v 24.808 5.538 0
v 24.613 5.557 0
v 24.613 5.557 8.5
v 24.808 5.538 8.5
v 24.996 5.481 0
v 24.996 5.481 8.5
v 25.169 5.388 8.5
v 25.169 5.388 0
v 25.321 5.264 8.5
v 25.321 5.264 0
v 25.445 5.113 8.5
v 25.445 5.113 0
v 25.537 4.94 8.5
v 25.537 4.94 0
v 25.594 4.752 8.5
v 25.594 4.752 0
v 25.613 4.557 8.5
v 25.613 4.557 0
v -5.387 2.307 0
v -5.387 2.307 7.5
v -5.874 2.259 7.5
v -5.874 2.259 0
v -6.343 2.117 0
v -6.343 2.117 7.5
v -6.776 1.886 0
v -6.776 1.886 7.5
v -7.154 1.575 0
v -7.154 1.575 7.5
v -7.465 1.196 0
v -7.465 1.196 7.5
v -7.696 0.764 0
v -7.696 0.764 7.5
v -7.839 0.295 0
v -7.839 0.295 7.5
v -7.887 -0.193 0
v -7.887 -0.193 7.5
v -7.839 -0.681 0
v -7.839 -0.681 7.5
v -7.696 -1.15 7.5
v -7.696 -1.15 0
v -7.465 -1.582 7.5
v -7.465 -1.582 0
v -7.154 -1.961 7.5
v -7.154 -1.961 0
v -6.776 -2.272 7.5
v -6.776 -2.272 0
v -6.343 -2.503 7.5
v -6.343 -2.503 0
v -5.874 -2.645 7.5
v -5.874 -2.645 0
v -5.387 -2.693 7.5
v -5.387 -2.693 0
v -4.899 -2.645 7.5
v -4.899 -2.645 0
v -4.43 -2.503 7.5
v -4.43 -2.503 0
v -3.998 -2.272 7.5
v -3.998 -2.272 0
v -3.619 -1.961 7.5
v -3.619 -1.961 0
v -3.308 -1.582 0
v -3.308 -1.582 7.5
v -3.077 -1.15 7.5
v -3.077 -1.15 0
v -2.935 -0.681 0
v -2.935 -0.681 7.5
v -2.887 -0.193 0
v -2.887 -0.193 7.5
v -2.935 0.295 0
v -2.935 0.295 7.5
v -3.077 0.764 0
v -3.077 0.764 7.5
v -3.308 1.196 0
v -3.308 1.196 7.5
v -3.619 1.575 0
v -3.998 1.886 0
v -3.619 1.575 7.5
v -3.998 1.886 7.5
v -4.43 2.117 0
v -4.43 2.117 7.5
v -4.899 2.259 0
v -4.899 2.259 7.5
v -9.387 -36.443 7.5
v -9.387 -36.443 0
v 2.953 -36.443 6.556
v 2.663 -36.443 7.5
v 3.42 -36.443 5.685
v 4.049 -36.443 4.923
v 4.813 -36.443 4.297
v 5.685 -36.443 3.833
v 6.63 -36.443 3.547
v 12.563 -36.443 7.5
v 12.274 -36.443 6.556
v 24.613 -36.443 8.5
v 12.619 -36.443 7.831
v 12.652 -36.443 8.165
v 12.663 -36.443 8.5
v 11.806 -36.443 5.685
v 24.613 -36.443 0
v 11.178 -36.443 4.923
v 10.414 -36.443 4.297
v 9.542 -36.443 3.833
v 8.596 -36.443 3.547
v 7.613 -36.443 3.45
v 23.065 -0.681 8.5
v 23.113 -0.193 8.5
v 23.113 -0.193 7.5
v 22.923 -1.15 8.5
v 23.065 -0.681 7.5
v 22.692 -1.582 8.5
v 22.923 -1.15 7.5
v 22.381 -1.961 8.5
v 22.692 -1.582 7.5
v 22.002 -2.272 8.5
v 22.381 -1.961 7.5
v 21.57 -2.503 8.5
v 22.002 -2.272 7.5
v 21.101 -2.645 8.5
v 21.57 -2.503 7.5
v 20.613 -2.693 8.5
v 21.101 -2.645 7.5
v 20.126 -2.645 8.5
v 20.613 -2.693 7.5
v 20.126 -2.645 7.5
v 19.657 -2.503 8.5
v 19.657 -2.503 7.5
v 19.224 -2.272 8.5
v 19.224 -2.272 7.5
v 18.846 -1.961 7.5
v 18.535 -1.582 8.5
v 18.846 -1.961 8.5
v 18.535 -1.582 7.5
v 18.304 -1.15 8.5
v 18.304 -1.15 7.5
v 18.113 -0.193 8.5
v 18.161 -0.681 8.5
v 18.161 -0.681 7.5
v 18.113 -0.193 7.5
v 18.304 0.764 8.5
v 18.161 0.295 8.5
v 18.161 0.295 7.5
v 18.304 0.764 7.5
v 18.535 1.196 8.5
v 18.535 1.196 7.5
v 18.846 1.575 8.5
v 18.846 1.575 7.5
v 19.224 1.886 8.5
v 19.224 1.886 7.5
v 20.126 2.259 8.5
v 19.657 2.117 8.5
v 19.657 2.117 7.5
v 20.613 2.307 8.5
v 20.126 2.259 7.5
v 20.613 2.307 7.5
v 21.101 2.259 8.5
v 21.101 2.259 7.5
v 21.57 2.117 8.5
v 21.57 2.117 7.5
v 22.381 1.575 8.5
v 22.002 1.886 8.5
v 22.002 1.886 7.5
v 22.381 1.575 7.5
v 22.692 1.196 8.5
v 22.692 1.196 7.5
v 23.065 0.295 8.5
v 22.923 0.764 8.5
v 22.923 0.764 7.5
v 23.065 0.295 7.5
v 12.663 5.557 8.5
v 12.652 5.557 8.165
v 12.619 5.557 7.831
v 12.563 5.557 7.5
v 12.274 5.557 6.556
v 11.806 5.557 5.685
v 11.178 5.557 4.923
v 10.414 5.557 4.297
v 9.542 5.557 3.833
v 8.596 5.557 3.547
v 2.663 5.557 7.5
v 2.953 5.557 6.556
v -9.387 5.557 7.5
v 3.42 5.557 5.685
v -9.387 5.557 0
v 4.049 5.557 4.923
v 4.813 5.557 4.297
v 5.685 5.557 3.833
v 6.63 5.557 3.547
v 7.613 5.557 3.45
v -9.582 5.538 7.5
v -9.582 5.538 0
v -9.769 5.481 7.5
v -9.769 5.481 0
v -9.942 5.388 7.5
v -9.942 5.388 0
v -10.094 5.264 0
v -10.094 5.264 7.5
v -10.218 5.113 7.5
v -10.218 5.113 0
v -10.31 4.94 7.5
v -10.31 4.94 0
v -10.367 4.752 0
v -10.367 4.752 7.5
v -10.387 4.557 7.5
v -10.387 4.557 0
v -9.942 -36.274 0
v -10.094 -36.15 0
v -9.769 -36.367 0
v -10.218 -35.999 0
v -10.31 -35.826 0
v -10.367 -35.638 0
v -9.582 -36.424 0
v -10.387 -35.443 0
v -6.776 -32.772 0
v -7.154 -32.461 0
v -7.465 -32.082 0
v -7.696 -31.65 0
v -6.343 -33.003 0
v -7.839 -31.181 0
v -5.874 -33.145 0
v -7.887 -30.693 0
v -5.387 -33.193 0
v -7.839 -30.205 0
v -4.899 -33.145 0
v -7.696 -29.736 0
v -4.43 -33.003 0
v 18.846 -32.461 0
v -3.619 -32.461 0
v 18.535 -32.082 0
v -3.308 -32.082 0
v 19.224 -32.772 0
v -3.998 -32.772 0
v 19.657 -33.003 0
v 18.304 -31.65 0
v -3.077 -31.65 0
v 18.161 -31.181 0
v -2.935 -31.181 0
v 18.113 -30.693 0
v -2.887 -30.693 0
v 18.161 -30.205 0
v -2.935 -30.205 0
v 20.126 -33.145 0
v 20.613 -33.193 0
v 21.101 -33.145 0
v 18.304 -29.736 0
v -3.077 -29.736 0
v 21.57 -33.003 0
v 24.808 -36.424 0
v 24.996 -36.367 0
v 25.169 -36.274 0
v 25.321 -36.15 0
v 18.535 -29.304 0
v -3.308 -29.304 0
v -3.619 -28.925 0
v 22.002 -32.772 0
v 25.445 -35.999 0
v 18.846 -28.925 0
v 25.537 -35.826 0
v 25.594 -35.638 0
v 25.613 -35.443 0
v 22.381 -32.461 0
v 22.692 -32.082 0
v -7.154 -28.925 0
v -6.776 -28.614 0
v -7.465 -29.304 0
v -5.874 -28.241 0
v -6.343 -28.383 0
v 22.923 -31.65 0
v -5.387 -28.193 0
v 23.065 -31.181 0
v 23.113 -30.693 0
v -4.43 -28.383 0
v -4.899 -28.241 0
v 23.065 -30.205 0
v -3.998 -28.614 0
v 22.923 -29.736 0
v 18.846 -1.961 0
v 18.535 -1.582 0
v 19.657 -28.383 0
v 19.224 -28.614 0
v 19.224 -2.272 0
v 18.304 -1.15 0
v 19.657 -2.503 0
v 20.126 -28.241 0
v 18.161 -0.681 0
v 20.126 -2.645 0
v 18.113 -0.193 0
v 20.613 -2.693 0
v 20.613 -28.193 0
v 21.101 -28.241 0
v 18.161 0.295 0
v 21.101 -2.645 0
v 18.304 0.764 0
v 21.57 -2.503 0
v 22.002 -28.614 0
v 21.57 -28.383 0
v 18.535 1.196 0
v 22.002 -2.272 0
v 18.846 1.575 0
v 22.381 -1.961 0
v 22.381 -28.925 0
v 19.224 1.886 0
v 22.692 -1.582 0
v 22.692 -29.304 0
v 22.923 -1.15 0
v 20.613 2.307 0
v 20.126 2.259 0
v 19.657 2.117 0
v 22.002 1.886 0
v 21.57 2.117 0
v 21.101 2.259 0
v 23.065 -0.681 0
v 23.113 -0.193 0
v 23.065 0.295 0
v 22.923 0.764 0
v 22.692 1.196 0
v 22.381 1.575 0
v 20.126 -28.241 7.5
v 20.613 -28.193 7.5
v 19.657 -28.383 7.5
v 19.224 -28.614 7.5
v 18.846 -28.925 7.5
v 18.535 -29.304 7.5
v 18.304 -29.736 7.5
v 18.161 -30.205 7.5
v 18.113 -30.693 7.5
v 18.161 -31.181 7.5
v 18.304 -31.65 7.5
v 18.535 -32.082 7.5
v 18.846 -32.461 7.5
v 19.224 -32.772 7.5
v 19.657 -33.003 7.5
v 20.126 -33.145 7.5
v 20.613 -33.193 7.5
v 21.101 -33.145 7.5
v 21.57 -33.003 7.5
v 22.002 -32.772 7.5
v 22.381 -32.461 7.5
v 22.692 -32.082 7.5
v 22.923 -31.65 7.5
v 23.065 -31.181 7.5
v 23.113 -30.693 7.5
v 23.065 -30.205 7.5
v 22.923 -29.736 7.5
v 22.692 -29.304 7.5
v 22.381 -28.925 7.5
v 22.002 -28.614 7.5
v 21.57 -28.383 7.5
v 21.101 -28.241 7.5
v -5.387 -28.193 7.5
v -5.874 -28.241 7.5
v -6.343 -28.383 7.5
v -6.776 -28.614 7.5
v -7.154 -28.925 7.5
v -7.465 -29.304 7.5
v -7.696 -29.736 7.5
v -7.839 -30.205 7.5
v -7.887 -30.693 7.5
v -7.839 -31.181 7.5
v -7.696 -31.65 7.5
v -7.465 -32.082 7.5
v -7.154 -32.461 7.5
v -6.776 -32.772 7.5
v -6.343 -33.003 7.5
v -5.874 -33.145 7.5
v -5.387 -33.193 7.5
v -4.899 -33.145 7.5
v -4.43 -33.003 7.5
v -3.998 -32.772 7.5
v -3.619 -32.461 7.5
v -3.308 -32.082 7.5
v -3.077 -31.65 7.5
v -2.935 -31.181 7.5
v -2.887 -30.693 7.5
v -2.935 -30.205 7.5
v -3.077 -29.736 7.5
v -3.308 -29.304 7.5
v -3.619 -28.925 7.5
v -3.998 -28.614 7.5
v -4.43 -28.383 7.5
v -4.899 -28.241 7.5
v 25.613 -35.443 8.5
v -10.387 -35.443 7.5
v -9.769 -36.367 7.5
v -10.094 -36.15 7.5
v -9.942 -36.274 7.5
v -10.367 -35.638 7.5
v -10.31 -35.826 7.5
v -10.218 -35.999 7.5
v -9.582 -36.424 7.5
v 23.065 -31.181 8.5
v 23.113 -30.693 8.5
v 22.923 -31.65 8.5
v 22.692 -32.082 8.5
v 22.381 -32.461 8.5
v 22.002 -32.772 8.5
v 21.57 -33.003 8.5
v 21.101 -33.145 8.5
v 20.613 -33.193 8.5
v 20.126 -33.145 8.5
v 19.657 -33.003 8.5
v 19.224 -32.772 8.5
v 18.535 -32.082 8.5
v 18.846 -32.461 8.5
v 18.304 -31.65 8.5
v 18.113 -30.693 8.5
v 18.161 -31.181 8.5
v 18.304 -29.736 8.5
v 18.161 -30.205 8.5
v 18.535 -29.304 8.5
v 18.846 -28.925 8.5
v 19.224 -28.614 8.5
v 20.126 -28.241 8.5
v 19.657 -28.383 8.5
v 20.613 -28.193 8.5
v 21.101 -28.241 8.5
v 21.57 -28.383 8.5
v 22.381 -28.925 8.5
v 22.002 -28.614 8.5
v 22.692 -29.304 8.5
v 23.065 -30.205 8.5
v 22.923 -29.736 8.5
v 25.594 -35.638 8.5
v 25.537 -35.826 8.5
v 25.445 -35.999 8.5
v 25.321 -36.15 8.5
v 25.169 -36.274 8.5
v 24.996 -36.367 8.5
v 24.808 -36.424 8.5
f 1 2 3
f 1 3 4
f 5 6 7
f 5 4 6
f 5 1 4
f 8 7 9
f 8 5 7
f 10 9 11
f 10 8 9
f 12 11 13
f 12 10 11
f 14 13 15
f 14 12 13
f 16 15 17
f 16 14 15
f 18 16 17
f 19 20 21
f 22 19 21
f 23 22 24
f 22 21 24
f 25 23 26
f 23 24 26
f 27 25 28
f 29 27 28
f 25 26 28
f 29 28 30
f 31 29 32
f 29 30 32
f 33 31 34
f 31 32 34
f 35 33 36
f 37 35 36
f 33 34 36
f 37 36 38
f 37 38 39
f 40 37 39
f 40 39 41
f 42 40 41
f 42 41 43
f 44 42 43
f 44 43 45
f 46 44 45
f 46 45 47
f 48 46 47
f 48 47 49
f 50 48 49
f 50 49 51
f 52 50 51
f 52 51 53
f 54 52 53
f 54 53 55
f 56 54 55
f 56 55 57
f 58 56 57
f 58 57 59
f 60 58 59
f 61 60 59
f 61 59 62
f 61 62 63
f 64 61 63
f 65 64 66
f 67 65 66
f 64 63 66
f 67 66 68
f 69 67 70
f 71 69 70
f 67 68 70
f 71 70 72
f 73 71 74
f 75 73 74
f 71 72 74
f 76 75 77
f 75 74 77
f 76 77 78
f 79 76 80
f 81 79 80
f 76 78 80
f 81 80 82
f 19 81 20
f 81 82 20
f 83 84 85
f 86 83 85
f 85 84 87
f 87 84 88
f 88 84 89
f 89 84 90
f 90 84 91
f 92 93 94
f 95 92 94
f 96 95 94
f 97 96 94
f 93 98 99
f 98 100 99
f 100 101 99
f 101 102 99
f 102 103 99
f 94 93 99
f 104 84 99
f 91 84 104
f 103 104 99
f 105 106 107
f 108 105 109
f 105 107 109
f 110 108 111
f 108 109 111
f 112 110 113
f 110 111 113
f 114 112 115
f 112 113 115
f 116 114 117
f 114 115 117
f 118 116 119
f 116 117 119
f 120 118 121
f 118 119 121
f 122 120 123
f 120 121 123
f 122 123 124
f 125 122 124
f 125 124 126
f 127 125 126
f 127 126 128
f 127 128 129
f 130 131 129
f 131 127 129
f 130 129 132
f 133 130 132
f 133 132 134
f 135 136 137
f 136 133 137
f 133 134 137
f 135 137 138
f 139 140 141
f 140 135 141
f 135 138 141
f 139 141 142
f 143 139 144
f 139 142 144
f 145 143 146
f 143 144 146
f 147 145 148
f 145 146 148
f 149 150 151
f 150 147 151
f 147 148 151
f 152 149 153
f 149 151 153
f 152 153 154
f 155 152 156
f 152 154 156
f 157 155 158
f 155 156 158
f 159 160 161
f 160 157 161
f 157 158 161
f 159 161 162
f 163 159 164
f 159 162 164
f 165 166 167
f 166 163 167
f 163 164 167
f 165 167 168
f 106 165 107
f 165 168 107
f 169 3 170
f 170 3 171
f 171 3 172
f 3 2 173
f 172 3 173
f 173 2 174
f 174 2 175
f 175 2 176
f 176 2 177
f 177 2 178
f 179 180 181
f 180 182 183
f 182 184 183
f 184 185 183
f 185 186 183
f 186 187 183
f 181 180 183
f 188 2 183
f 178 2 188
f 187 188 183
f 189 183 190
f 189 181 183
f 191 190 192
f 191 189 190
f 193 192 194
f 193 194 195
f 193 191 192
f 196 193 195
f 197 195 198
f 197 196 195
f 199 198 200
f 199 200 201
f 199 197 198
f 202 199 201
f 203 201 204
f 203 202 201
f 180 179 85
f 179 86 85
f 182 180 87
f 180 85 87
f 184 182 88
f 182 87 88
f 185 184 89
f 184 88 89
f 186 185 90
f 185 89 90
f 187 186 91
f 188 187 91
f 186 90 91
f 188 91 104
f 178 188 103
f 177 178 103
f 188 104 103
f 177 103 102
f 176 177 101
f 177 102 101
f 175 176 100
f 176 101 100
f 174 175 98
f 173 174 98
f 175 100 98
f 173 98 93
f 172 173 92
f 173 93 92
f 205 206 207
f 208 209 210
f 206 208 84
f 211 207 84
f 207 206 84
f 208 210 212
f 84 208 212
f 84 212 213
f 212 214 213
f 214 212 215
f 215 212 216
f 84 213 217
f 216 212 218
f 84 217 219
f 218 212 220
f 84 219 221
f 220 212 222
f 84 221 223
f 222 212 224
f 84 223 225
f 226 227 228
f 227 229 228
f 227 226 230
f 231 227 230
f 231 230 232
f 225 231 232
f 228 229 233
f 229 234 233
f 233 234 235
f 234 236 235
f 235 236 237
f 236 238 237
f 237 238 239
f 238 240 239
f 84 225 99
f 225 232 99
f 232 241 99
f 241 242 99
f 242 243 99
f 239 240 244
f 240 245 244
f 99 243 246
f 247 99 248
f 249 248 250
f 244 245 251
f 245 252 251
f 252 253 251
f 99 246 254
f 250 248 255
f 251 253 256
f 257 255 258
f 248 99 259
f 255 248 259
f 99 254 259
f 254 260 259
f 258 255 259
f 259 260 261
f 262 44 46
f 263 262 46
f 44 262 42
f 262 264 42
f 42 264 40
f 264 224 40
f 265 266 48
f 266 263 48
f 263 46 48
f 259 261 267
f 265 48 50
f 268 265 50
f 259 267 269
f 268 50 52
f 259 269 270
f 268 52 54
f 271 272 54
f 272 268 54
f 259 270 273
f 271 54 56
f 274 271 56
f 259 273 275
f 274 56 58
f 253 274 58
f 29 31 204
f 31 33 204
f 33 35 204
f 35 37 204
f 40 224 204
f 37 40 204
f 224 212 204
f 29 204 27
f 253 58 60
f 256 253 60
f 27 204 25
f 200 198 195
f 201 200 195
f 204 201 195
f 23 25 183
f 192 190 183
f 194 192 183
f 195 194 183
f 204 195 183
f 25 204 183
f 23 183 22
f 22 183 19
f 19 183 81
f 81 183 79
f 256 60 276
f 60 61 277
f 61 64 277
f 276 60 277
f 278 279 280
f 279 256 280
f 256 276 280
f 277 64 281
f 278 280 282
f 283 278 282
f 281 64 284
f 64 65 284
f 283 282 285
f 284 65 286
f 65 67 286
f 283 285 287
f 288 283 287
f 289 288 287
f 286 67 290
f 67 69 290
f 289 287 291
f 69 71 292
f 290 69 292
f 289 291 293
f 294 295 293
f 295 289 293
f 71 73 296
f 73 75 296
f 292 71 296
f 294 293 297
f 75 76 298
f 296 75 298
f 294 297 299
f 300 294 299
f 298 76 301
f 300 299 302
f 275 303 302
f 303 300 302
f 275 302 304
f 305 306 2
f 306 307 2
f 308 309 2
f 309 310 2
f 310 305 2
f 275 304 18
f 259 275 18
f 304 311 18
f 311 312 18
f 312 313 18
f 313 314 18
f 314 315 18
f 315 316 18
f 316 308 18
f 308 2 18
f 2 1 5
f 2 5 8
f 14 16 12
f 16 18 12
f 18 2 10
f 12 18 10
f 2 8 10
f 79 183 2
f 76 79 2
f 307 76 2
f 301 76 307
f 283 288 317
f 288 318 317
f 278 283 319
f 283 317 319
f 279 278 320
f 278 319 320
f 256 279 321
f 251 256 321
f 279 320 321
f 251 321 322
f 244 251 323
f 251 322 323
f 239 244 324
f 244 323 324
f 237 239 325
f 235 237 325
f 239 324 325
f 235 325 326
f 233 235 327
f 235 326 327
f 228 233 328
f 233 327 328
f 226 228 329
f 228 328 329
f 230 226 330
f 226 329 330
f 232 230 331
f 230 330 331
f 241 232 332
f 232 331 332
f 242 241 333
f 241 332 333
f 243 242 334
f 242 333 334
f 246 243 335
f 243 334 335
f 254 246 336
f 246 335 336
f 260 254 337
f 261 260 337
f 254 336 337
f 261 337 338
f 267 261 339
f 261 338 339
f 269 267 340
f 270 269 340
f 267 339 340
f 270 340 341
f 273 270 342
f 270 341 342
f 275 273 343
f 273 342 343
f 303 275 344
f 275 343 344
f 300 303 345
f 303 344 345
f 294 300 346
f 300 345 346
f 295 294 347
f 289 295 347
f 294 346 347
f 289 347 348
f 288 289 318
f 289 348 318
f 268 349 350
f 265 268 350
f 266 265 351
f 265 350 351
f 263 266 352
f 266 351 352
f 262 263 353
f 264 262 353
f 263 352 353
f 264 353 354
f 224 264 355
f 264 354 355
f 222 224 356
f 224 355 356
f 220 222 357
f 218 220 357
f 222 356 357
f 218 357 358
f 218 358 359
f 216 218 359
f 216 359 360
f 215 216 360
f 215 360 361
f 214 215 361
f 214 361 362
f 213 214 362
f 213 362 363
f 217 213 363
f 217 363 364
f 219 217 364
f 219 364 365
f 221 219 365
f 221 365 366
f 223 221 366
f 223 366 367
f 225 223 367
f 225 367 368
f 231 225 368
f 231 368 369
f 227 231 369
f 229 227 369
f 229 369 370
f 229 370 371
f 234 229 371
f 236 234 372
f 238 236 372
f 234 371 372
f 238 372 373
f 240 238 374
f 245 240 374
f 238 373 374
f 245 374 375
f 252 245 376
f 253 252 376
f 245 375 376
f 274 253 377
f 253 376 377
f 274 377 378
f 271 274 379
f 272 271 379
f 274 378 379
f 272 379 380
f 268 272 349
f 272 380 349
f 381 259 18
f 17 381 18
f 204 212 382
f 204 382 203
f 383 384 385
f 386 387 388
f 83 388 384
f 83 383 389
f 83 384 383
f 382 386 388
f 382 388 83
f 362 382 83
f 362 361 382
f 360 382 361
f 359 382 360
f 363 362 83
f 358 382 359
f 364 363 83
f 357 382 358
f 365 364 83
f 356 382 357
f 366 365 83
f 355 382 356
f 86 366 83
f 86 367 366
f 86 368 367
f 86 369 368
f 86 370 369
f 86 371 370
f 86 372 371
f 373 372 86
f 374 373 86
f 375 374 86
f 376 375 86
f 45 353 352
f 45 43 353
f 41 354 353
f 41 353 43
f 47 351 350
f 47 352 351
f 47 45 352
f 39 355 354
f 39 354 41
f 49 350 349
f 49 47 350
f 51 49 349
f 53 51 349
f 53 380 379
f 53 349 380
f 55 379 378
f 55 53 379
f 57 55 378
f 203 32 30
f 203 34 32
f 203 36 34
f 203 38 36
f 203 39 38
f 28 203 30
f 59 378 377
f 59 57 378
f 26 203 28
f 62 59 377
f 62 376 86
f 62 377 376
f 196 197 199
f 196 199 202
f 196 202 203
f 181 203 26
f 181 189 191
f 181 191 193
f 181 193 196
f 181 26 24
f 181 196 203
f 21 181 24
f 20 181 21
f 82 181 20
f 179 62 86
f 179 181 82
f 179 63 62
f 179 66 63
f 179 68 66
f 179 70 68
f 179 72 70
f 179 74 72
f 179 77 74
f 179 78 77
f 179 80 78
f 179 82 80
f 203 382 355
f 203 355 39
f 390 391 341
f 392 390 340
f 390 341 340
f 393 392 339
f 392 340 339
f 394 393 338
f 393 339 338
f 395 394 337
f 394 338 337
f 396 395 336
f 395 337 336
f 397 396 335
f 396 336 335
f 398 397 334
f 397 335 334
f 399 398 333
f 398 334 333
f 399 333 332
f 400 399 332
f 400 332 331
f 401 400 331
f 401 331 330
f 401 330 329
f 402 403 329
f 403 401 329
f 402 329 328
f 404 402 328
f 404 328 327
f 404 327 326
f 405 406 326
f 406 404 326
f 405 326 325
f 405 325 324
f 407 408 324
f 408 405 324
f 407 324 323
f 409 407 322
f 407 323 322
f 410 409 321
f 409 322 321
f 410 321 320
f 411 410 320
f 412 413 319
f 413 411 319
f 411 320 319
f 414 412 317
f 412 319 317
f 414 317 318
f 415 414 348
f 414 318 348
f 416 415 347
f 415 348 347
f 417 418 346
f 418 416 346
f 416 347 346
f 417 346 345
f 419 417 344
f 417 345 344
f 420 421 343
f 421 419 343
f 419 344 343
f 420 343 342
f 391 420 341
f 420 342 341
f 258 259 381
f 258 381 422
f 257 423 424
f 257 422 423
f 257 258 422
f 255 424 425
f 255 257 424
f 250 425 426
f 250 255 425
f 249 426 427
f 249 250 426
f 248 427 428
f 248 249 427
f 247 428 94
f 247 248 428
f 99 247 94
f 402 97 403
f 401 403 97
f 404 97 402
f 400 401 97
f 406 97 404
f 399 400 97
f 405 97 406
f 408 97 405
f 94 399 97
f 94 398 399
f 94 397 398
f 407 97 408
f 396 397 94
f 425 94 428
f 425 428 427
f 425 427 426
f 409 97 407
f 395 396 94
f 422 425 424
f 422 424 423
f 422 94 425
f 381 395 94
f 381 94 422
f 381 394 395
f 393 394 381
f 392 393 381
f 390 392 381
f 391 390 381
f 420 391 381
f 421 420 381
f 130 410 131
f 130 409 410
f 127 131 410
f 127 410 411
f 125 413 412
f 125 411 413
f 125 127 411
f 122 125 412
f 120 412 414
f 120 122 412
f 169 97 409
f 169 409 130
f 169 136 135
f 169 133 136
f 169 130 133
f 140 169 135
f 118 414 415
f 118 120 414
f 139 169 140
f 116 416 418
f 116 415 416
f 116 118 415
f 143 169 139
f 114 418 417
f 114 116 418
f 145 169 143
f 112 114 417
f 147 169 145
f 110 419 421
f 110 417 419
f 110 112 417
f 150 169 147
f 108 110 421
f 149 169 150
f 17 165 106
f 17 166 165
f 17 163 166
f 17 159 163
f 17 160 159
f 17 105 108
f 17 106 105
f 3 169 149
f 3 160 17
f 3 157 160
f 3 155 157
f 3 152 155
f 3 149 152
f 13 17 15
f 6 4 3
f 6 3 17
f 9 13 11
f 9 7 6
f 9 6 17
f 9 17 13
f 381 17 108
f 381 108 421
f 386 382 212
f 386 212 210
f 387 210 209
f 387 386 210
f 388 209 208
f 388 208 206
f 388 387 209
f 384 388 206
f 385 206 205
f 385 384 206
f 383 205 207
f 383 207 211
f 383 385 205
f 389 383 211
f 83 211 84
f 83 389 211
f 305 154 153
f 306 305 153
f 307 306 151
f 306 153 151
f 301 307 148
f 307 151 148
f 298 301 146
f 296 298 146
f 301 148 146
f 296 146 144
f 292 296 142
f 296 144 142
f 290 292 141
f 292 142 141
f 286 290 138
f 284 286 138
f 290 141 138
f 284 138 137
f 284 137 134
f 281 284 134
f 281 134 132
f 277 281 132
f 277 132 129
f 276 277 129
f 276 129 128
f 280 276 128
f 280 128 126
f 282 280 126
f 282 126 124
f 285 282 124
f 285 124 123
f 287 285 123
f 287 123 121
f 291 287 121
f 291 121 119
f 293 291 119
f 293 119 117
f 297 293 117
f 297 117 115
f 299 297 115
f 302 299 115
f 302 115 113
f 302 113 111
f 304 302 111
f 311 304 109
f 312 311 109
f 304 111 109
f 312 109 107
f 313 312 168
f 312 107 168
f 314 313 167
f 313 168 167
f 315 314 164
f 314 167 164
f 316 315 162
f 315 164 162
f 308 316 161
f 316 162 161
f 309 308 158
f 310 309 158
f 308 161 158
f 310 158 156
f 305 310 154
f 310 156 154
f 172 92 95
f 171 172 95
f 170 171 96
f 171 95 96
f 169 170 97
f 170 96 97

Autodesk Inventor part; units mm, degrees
ref_plane "YZ Plane" through (0, 0, 0) normal (1, 0, 0) x (0, 1, 0)
ref_plane "XZ Plane" through (0, 0, 0) normal (0, 1, 0) x (-1, 0, 0)
ref_plane "XY Plane" through (0, 0, 0) normal (0, 0, 1) x (1, 0, 0)
sketch "Szkic1" plane through (0, 0, 0) normal (0, 0, 1) x (1, 0, 0)
  line L0 (-10.3866, 5.557) -> (25.6134, 5.557)
  line L1 (25.6134, 5.557) -> (25.6134, -36.443)
  line L2 (25.6134, -36.443) -> (-10.3866, -36.443)
  line L3 (-10.3866, -36.443) -> (-10.3866, 5.557)
  point P0 (0, 0)
  point P1 (20.6134, -0.193)
  point P2 (20.6134, -30.693)
  point P3 (-5.3866, -0.193)
  point P4 (-5.3866, -30.693)
  dimension "d0" = 36
  dimension "d1" = 42
  dimension "d2" = 5
  dimension "d3" = 5
  dimension "d4" = 5
  dimension "d5" = 5
  dimension "d6" = 5.75
  dimension "d7" = 5.75
  dimension "d8" = 5.75
  dimension "d9" = 5.75
extrude "Wyciągnięcie proste1" add sketch "Szkic1" along normal blind 7.5
hole "Otwór1" at (20.6134, -0.193, 0) at (20.6134, -30.693, 0) at (-5.3866, -0.193, 0) at (-5.3866, -30.693, 0) direction (0, 0, 1) diameter 5 end through all
sketch "Szkic2" plane through (-10.3866, -36.443, 0) normal (0, -1, 0) x (1, 0, 0)
  line L0 (36, 0) -> (0, 0) projected
  line L1 (36, 0) -> (36, 7.5) projected
  line L2 (0, 7.5) -> (36, 7.5) projected
  line L3 (0, 0) -> (0, 7.5) projected
  line L4 (36, 7.5) -> (0, 7.5) projected
  circle A0 centre (18, 8.5) radius 5.05
  point P0 (10.3866, 0)
  dimension "d19" = 36
  dimension "d25" = 8.5
  dimension "d26" = 18
  dimension "d27" = 10.1
extrude "Wyciągnięcie proste2" cut sketch "Szkic2" against normal through all contours A0 L2 | L2 A0
fillet "Zaokrąglenie1" radius 1 4 edges at (-10.3866, -36.443, 3.75) (-10.3866, 5.557, 3.75) (25.6134, -36.443, 3.75) (25.6134, 5.557, 3.75)
sketch "Szkic3" plane through (0, 0, 7.5) normal (0, 0, 1) x (1, 0, 0)
  arc A0 (25.6134, 4.557) -> (24.6134, 5.557) centre (24.6134, 4.557) ccw projected
  line L0 (24.6134, 5.557) -> (12.5634, 5.557) projected
  line L1 (12.5634, 5.557) -> (12.5634, -36.443) projected
  line L2 (12.5634, -36.443) -> (24.6134, -36.443) projected
  arc A1 (24.6134, -36.443) -> (25.6134, -35.443) centre (24.6134, -35.443) ccw projected
  line L3 (25.6134, -35.443) -> (25.6134, 4.557) projected
  circle A2 centre (20.6134, -0.193) radius 2.5 projected
  circle A3 centre (20.6134, -30.693) radius 2.5 projected
  point P0 (0, 0)
extrude "Wyciągnięcie proste3" add sketch "Szkic3" along normal blind 1
sketch "Szkic4" plane through (-9.3866, -36.443, 0) normal (0, -1, 0) x (1, 0, 0)
  line L0 (34, 8.5) -> (34, 0) projected
  line L1 (21.95, 8.5) -> (34, 8.5) projected
  line L2 (21.95, 7.5) -> (21.95, 8.5) projected
  arc A0 (12.05, 7.5) -> (21.95, 7.5) centre (17, 8.5) ccw projected
  line L3 (0, 7.5) -> (12.05, 7.5) projected
  line L4 (0, 0) -> (0, 7.5) projected
  line L5 (34, 0) -> (0, 0) projected
  circle A1 centre (17, 8.5) radius 5.05
  point P0 (9.3866, 0)
  dimension "d30" = 10.1
extrude "Wyciągnięcie proste4" cut sketch "Szkic4" against normal through all contours A1 L2 L1 | L1 L2 A0 A1
equation "\"d7\" = d6"
equation "\"d8\" = d7"
equation "\"d9\" = d6"
equation "\"d26\" = 0.5 * d19"
properties part number "3DP_ABS_X_Axis_Linear_Shaft_Clamp_Bottom"
